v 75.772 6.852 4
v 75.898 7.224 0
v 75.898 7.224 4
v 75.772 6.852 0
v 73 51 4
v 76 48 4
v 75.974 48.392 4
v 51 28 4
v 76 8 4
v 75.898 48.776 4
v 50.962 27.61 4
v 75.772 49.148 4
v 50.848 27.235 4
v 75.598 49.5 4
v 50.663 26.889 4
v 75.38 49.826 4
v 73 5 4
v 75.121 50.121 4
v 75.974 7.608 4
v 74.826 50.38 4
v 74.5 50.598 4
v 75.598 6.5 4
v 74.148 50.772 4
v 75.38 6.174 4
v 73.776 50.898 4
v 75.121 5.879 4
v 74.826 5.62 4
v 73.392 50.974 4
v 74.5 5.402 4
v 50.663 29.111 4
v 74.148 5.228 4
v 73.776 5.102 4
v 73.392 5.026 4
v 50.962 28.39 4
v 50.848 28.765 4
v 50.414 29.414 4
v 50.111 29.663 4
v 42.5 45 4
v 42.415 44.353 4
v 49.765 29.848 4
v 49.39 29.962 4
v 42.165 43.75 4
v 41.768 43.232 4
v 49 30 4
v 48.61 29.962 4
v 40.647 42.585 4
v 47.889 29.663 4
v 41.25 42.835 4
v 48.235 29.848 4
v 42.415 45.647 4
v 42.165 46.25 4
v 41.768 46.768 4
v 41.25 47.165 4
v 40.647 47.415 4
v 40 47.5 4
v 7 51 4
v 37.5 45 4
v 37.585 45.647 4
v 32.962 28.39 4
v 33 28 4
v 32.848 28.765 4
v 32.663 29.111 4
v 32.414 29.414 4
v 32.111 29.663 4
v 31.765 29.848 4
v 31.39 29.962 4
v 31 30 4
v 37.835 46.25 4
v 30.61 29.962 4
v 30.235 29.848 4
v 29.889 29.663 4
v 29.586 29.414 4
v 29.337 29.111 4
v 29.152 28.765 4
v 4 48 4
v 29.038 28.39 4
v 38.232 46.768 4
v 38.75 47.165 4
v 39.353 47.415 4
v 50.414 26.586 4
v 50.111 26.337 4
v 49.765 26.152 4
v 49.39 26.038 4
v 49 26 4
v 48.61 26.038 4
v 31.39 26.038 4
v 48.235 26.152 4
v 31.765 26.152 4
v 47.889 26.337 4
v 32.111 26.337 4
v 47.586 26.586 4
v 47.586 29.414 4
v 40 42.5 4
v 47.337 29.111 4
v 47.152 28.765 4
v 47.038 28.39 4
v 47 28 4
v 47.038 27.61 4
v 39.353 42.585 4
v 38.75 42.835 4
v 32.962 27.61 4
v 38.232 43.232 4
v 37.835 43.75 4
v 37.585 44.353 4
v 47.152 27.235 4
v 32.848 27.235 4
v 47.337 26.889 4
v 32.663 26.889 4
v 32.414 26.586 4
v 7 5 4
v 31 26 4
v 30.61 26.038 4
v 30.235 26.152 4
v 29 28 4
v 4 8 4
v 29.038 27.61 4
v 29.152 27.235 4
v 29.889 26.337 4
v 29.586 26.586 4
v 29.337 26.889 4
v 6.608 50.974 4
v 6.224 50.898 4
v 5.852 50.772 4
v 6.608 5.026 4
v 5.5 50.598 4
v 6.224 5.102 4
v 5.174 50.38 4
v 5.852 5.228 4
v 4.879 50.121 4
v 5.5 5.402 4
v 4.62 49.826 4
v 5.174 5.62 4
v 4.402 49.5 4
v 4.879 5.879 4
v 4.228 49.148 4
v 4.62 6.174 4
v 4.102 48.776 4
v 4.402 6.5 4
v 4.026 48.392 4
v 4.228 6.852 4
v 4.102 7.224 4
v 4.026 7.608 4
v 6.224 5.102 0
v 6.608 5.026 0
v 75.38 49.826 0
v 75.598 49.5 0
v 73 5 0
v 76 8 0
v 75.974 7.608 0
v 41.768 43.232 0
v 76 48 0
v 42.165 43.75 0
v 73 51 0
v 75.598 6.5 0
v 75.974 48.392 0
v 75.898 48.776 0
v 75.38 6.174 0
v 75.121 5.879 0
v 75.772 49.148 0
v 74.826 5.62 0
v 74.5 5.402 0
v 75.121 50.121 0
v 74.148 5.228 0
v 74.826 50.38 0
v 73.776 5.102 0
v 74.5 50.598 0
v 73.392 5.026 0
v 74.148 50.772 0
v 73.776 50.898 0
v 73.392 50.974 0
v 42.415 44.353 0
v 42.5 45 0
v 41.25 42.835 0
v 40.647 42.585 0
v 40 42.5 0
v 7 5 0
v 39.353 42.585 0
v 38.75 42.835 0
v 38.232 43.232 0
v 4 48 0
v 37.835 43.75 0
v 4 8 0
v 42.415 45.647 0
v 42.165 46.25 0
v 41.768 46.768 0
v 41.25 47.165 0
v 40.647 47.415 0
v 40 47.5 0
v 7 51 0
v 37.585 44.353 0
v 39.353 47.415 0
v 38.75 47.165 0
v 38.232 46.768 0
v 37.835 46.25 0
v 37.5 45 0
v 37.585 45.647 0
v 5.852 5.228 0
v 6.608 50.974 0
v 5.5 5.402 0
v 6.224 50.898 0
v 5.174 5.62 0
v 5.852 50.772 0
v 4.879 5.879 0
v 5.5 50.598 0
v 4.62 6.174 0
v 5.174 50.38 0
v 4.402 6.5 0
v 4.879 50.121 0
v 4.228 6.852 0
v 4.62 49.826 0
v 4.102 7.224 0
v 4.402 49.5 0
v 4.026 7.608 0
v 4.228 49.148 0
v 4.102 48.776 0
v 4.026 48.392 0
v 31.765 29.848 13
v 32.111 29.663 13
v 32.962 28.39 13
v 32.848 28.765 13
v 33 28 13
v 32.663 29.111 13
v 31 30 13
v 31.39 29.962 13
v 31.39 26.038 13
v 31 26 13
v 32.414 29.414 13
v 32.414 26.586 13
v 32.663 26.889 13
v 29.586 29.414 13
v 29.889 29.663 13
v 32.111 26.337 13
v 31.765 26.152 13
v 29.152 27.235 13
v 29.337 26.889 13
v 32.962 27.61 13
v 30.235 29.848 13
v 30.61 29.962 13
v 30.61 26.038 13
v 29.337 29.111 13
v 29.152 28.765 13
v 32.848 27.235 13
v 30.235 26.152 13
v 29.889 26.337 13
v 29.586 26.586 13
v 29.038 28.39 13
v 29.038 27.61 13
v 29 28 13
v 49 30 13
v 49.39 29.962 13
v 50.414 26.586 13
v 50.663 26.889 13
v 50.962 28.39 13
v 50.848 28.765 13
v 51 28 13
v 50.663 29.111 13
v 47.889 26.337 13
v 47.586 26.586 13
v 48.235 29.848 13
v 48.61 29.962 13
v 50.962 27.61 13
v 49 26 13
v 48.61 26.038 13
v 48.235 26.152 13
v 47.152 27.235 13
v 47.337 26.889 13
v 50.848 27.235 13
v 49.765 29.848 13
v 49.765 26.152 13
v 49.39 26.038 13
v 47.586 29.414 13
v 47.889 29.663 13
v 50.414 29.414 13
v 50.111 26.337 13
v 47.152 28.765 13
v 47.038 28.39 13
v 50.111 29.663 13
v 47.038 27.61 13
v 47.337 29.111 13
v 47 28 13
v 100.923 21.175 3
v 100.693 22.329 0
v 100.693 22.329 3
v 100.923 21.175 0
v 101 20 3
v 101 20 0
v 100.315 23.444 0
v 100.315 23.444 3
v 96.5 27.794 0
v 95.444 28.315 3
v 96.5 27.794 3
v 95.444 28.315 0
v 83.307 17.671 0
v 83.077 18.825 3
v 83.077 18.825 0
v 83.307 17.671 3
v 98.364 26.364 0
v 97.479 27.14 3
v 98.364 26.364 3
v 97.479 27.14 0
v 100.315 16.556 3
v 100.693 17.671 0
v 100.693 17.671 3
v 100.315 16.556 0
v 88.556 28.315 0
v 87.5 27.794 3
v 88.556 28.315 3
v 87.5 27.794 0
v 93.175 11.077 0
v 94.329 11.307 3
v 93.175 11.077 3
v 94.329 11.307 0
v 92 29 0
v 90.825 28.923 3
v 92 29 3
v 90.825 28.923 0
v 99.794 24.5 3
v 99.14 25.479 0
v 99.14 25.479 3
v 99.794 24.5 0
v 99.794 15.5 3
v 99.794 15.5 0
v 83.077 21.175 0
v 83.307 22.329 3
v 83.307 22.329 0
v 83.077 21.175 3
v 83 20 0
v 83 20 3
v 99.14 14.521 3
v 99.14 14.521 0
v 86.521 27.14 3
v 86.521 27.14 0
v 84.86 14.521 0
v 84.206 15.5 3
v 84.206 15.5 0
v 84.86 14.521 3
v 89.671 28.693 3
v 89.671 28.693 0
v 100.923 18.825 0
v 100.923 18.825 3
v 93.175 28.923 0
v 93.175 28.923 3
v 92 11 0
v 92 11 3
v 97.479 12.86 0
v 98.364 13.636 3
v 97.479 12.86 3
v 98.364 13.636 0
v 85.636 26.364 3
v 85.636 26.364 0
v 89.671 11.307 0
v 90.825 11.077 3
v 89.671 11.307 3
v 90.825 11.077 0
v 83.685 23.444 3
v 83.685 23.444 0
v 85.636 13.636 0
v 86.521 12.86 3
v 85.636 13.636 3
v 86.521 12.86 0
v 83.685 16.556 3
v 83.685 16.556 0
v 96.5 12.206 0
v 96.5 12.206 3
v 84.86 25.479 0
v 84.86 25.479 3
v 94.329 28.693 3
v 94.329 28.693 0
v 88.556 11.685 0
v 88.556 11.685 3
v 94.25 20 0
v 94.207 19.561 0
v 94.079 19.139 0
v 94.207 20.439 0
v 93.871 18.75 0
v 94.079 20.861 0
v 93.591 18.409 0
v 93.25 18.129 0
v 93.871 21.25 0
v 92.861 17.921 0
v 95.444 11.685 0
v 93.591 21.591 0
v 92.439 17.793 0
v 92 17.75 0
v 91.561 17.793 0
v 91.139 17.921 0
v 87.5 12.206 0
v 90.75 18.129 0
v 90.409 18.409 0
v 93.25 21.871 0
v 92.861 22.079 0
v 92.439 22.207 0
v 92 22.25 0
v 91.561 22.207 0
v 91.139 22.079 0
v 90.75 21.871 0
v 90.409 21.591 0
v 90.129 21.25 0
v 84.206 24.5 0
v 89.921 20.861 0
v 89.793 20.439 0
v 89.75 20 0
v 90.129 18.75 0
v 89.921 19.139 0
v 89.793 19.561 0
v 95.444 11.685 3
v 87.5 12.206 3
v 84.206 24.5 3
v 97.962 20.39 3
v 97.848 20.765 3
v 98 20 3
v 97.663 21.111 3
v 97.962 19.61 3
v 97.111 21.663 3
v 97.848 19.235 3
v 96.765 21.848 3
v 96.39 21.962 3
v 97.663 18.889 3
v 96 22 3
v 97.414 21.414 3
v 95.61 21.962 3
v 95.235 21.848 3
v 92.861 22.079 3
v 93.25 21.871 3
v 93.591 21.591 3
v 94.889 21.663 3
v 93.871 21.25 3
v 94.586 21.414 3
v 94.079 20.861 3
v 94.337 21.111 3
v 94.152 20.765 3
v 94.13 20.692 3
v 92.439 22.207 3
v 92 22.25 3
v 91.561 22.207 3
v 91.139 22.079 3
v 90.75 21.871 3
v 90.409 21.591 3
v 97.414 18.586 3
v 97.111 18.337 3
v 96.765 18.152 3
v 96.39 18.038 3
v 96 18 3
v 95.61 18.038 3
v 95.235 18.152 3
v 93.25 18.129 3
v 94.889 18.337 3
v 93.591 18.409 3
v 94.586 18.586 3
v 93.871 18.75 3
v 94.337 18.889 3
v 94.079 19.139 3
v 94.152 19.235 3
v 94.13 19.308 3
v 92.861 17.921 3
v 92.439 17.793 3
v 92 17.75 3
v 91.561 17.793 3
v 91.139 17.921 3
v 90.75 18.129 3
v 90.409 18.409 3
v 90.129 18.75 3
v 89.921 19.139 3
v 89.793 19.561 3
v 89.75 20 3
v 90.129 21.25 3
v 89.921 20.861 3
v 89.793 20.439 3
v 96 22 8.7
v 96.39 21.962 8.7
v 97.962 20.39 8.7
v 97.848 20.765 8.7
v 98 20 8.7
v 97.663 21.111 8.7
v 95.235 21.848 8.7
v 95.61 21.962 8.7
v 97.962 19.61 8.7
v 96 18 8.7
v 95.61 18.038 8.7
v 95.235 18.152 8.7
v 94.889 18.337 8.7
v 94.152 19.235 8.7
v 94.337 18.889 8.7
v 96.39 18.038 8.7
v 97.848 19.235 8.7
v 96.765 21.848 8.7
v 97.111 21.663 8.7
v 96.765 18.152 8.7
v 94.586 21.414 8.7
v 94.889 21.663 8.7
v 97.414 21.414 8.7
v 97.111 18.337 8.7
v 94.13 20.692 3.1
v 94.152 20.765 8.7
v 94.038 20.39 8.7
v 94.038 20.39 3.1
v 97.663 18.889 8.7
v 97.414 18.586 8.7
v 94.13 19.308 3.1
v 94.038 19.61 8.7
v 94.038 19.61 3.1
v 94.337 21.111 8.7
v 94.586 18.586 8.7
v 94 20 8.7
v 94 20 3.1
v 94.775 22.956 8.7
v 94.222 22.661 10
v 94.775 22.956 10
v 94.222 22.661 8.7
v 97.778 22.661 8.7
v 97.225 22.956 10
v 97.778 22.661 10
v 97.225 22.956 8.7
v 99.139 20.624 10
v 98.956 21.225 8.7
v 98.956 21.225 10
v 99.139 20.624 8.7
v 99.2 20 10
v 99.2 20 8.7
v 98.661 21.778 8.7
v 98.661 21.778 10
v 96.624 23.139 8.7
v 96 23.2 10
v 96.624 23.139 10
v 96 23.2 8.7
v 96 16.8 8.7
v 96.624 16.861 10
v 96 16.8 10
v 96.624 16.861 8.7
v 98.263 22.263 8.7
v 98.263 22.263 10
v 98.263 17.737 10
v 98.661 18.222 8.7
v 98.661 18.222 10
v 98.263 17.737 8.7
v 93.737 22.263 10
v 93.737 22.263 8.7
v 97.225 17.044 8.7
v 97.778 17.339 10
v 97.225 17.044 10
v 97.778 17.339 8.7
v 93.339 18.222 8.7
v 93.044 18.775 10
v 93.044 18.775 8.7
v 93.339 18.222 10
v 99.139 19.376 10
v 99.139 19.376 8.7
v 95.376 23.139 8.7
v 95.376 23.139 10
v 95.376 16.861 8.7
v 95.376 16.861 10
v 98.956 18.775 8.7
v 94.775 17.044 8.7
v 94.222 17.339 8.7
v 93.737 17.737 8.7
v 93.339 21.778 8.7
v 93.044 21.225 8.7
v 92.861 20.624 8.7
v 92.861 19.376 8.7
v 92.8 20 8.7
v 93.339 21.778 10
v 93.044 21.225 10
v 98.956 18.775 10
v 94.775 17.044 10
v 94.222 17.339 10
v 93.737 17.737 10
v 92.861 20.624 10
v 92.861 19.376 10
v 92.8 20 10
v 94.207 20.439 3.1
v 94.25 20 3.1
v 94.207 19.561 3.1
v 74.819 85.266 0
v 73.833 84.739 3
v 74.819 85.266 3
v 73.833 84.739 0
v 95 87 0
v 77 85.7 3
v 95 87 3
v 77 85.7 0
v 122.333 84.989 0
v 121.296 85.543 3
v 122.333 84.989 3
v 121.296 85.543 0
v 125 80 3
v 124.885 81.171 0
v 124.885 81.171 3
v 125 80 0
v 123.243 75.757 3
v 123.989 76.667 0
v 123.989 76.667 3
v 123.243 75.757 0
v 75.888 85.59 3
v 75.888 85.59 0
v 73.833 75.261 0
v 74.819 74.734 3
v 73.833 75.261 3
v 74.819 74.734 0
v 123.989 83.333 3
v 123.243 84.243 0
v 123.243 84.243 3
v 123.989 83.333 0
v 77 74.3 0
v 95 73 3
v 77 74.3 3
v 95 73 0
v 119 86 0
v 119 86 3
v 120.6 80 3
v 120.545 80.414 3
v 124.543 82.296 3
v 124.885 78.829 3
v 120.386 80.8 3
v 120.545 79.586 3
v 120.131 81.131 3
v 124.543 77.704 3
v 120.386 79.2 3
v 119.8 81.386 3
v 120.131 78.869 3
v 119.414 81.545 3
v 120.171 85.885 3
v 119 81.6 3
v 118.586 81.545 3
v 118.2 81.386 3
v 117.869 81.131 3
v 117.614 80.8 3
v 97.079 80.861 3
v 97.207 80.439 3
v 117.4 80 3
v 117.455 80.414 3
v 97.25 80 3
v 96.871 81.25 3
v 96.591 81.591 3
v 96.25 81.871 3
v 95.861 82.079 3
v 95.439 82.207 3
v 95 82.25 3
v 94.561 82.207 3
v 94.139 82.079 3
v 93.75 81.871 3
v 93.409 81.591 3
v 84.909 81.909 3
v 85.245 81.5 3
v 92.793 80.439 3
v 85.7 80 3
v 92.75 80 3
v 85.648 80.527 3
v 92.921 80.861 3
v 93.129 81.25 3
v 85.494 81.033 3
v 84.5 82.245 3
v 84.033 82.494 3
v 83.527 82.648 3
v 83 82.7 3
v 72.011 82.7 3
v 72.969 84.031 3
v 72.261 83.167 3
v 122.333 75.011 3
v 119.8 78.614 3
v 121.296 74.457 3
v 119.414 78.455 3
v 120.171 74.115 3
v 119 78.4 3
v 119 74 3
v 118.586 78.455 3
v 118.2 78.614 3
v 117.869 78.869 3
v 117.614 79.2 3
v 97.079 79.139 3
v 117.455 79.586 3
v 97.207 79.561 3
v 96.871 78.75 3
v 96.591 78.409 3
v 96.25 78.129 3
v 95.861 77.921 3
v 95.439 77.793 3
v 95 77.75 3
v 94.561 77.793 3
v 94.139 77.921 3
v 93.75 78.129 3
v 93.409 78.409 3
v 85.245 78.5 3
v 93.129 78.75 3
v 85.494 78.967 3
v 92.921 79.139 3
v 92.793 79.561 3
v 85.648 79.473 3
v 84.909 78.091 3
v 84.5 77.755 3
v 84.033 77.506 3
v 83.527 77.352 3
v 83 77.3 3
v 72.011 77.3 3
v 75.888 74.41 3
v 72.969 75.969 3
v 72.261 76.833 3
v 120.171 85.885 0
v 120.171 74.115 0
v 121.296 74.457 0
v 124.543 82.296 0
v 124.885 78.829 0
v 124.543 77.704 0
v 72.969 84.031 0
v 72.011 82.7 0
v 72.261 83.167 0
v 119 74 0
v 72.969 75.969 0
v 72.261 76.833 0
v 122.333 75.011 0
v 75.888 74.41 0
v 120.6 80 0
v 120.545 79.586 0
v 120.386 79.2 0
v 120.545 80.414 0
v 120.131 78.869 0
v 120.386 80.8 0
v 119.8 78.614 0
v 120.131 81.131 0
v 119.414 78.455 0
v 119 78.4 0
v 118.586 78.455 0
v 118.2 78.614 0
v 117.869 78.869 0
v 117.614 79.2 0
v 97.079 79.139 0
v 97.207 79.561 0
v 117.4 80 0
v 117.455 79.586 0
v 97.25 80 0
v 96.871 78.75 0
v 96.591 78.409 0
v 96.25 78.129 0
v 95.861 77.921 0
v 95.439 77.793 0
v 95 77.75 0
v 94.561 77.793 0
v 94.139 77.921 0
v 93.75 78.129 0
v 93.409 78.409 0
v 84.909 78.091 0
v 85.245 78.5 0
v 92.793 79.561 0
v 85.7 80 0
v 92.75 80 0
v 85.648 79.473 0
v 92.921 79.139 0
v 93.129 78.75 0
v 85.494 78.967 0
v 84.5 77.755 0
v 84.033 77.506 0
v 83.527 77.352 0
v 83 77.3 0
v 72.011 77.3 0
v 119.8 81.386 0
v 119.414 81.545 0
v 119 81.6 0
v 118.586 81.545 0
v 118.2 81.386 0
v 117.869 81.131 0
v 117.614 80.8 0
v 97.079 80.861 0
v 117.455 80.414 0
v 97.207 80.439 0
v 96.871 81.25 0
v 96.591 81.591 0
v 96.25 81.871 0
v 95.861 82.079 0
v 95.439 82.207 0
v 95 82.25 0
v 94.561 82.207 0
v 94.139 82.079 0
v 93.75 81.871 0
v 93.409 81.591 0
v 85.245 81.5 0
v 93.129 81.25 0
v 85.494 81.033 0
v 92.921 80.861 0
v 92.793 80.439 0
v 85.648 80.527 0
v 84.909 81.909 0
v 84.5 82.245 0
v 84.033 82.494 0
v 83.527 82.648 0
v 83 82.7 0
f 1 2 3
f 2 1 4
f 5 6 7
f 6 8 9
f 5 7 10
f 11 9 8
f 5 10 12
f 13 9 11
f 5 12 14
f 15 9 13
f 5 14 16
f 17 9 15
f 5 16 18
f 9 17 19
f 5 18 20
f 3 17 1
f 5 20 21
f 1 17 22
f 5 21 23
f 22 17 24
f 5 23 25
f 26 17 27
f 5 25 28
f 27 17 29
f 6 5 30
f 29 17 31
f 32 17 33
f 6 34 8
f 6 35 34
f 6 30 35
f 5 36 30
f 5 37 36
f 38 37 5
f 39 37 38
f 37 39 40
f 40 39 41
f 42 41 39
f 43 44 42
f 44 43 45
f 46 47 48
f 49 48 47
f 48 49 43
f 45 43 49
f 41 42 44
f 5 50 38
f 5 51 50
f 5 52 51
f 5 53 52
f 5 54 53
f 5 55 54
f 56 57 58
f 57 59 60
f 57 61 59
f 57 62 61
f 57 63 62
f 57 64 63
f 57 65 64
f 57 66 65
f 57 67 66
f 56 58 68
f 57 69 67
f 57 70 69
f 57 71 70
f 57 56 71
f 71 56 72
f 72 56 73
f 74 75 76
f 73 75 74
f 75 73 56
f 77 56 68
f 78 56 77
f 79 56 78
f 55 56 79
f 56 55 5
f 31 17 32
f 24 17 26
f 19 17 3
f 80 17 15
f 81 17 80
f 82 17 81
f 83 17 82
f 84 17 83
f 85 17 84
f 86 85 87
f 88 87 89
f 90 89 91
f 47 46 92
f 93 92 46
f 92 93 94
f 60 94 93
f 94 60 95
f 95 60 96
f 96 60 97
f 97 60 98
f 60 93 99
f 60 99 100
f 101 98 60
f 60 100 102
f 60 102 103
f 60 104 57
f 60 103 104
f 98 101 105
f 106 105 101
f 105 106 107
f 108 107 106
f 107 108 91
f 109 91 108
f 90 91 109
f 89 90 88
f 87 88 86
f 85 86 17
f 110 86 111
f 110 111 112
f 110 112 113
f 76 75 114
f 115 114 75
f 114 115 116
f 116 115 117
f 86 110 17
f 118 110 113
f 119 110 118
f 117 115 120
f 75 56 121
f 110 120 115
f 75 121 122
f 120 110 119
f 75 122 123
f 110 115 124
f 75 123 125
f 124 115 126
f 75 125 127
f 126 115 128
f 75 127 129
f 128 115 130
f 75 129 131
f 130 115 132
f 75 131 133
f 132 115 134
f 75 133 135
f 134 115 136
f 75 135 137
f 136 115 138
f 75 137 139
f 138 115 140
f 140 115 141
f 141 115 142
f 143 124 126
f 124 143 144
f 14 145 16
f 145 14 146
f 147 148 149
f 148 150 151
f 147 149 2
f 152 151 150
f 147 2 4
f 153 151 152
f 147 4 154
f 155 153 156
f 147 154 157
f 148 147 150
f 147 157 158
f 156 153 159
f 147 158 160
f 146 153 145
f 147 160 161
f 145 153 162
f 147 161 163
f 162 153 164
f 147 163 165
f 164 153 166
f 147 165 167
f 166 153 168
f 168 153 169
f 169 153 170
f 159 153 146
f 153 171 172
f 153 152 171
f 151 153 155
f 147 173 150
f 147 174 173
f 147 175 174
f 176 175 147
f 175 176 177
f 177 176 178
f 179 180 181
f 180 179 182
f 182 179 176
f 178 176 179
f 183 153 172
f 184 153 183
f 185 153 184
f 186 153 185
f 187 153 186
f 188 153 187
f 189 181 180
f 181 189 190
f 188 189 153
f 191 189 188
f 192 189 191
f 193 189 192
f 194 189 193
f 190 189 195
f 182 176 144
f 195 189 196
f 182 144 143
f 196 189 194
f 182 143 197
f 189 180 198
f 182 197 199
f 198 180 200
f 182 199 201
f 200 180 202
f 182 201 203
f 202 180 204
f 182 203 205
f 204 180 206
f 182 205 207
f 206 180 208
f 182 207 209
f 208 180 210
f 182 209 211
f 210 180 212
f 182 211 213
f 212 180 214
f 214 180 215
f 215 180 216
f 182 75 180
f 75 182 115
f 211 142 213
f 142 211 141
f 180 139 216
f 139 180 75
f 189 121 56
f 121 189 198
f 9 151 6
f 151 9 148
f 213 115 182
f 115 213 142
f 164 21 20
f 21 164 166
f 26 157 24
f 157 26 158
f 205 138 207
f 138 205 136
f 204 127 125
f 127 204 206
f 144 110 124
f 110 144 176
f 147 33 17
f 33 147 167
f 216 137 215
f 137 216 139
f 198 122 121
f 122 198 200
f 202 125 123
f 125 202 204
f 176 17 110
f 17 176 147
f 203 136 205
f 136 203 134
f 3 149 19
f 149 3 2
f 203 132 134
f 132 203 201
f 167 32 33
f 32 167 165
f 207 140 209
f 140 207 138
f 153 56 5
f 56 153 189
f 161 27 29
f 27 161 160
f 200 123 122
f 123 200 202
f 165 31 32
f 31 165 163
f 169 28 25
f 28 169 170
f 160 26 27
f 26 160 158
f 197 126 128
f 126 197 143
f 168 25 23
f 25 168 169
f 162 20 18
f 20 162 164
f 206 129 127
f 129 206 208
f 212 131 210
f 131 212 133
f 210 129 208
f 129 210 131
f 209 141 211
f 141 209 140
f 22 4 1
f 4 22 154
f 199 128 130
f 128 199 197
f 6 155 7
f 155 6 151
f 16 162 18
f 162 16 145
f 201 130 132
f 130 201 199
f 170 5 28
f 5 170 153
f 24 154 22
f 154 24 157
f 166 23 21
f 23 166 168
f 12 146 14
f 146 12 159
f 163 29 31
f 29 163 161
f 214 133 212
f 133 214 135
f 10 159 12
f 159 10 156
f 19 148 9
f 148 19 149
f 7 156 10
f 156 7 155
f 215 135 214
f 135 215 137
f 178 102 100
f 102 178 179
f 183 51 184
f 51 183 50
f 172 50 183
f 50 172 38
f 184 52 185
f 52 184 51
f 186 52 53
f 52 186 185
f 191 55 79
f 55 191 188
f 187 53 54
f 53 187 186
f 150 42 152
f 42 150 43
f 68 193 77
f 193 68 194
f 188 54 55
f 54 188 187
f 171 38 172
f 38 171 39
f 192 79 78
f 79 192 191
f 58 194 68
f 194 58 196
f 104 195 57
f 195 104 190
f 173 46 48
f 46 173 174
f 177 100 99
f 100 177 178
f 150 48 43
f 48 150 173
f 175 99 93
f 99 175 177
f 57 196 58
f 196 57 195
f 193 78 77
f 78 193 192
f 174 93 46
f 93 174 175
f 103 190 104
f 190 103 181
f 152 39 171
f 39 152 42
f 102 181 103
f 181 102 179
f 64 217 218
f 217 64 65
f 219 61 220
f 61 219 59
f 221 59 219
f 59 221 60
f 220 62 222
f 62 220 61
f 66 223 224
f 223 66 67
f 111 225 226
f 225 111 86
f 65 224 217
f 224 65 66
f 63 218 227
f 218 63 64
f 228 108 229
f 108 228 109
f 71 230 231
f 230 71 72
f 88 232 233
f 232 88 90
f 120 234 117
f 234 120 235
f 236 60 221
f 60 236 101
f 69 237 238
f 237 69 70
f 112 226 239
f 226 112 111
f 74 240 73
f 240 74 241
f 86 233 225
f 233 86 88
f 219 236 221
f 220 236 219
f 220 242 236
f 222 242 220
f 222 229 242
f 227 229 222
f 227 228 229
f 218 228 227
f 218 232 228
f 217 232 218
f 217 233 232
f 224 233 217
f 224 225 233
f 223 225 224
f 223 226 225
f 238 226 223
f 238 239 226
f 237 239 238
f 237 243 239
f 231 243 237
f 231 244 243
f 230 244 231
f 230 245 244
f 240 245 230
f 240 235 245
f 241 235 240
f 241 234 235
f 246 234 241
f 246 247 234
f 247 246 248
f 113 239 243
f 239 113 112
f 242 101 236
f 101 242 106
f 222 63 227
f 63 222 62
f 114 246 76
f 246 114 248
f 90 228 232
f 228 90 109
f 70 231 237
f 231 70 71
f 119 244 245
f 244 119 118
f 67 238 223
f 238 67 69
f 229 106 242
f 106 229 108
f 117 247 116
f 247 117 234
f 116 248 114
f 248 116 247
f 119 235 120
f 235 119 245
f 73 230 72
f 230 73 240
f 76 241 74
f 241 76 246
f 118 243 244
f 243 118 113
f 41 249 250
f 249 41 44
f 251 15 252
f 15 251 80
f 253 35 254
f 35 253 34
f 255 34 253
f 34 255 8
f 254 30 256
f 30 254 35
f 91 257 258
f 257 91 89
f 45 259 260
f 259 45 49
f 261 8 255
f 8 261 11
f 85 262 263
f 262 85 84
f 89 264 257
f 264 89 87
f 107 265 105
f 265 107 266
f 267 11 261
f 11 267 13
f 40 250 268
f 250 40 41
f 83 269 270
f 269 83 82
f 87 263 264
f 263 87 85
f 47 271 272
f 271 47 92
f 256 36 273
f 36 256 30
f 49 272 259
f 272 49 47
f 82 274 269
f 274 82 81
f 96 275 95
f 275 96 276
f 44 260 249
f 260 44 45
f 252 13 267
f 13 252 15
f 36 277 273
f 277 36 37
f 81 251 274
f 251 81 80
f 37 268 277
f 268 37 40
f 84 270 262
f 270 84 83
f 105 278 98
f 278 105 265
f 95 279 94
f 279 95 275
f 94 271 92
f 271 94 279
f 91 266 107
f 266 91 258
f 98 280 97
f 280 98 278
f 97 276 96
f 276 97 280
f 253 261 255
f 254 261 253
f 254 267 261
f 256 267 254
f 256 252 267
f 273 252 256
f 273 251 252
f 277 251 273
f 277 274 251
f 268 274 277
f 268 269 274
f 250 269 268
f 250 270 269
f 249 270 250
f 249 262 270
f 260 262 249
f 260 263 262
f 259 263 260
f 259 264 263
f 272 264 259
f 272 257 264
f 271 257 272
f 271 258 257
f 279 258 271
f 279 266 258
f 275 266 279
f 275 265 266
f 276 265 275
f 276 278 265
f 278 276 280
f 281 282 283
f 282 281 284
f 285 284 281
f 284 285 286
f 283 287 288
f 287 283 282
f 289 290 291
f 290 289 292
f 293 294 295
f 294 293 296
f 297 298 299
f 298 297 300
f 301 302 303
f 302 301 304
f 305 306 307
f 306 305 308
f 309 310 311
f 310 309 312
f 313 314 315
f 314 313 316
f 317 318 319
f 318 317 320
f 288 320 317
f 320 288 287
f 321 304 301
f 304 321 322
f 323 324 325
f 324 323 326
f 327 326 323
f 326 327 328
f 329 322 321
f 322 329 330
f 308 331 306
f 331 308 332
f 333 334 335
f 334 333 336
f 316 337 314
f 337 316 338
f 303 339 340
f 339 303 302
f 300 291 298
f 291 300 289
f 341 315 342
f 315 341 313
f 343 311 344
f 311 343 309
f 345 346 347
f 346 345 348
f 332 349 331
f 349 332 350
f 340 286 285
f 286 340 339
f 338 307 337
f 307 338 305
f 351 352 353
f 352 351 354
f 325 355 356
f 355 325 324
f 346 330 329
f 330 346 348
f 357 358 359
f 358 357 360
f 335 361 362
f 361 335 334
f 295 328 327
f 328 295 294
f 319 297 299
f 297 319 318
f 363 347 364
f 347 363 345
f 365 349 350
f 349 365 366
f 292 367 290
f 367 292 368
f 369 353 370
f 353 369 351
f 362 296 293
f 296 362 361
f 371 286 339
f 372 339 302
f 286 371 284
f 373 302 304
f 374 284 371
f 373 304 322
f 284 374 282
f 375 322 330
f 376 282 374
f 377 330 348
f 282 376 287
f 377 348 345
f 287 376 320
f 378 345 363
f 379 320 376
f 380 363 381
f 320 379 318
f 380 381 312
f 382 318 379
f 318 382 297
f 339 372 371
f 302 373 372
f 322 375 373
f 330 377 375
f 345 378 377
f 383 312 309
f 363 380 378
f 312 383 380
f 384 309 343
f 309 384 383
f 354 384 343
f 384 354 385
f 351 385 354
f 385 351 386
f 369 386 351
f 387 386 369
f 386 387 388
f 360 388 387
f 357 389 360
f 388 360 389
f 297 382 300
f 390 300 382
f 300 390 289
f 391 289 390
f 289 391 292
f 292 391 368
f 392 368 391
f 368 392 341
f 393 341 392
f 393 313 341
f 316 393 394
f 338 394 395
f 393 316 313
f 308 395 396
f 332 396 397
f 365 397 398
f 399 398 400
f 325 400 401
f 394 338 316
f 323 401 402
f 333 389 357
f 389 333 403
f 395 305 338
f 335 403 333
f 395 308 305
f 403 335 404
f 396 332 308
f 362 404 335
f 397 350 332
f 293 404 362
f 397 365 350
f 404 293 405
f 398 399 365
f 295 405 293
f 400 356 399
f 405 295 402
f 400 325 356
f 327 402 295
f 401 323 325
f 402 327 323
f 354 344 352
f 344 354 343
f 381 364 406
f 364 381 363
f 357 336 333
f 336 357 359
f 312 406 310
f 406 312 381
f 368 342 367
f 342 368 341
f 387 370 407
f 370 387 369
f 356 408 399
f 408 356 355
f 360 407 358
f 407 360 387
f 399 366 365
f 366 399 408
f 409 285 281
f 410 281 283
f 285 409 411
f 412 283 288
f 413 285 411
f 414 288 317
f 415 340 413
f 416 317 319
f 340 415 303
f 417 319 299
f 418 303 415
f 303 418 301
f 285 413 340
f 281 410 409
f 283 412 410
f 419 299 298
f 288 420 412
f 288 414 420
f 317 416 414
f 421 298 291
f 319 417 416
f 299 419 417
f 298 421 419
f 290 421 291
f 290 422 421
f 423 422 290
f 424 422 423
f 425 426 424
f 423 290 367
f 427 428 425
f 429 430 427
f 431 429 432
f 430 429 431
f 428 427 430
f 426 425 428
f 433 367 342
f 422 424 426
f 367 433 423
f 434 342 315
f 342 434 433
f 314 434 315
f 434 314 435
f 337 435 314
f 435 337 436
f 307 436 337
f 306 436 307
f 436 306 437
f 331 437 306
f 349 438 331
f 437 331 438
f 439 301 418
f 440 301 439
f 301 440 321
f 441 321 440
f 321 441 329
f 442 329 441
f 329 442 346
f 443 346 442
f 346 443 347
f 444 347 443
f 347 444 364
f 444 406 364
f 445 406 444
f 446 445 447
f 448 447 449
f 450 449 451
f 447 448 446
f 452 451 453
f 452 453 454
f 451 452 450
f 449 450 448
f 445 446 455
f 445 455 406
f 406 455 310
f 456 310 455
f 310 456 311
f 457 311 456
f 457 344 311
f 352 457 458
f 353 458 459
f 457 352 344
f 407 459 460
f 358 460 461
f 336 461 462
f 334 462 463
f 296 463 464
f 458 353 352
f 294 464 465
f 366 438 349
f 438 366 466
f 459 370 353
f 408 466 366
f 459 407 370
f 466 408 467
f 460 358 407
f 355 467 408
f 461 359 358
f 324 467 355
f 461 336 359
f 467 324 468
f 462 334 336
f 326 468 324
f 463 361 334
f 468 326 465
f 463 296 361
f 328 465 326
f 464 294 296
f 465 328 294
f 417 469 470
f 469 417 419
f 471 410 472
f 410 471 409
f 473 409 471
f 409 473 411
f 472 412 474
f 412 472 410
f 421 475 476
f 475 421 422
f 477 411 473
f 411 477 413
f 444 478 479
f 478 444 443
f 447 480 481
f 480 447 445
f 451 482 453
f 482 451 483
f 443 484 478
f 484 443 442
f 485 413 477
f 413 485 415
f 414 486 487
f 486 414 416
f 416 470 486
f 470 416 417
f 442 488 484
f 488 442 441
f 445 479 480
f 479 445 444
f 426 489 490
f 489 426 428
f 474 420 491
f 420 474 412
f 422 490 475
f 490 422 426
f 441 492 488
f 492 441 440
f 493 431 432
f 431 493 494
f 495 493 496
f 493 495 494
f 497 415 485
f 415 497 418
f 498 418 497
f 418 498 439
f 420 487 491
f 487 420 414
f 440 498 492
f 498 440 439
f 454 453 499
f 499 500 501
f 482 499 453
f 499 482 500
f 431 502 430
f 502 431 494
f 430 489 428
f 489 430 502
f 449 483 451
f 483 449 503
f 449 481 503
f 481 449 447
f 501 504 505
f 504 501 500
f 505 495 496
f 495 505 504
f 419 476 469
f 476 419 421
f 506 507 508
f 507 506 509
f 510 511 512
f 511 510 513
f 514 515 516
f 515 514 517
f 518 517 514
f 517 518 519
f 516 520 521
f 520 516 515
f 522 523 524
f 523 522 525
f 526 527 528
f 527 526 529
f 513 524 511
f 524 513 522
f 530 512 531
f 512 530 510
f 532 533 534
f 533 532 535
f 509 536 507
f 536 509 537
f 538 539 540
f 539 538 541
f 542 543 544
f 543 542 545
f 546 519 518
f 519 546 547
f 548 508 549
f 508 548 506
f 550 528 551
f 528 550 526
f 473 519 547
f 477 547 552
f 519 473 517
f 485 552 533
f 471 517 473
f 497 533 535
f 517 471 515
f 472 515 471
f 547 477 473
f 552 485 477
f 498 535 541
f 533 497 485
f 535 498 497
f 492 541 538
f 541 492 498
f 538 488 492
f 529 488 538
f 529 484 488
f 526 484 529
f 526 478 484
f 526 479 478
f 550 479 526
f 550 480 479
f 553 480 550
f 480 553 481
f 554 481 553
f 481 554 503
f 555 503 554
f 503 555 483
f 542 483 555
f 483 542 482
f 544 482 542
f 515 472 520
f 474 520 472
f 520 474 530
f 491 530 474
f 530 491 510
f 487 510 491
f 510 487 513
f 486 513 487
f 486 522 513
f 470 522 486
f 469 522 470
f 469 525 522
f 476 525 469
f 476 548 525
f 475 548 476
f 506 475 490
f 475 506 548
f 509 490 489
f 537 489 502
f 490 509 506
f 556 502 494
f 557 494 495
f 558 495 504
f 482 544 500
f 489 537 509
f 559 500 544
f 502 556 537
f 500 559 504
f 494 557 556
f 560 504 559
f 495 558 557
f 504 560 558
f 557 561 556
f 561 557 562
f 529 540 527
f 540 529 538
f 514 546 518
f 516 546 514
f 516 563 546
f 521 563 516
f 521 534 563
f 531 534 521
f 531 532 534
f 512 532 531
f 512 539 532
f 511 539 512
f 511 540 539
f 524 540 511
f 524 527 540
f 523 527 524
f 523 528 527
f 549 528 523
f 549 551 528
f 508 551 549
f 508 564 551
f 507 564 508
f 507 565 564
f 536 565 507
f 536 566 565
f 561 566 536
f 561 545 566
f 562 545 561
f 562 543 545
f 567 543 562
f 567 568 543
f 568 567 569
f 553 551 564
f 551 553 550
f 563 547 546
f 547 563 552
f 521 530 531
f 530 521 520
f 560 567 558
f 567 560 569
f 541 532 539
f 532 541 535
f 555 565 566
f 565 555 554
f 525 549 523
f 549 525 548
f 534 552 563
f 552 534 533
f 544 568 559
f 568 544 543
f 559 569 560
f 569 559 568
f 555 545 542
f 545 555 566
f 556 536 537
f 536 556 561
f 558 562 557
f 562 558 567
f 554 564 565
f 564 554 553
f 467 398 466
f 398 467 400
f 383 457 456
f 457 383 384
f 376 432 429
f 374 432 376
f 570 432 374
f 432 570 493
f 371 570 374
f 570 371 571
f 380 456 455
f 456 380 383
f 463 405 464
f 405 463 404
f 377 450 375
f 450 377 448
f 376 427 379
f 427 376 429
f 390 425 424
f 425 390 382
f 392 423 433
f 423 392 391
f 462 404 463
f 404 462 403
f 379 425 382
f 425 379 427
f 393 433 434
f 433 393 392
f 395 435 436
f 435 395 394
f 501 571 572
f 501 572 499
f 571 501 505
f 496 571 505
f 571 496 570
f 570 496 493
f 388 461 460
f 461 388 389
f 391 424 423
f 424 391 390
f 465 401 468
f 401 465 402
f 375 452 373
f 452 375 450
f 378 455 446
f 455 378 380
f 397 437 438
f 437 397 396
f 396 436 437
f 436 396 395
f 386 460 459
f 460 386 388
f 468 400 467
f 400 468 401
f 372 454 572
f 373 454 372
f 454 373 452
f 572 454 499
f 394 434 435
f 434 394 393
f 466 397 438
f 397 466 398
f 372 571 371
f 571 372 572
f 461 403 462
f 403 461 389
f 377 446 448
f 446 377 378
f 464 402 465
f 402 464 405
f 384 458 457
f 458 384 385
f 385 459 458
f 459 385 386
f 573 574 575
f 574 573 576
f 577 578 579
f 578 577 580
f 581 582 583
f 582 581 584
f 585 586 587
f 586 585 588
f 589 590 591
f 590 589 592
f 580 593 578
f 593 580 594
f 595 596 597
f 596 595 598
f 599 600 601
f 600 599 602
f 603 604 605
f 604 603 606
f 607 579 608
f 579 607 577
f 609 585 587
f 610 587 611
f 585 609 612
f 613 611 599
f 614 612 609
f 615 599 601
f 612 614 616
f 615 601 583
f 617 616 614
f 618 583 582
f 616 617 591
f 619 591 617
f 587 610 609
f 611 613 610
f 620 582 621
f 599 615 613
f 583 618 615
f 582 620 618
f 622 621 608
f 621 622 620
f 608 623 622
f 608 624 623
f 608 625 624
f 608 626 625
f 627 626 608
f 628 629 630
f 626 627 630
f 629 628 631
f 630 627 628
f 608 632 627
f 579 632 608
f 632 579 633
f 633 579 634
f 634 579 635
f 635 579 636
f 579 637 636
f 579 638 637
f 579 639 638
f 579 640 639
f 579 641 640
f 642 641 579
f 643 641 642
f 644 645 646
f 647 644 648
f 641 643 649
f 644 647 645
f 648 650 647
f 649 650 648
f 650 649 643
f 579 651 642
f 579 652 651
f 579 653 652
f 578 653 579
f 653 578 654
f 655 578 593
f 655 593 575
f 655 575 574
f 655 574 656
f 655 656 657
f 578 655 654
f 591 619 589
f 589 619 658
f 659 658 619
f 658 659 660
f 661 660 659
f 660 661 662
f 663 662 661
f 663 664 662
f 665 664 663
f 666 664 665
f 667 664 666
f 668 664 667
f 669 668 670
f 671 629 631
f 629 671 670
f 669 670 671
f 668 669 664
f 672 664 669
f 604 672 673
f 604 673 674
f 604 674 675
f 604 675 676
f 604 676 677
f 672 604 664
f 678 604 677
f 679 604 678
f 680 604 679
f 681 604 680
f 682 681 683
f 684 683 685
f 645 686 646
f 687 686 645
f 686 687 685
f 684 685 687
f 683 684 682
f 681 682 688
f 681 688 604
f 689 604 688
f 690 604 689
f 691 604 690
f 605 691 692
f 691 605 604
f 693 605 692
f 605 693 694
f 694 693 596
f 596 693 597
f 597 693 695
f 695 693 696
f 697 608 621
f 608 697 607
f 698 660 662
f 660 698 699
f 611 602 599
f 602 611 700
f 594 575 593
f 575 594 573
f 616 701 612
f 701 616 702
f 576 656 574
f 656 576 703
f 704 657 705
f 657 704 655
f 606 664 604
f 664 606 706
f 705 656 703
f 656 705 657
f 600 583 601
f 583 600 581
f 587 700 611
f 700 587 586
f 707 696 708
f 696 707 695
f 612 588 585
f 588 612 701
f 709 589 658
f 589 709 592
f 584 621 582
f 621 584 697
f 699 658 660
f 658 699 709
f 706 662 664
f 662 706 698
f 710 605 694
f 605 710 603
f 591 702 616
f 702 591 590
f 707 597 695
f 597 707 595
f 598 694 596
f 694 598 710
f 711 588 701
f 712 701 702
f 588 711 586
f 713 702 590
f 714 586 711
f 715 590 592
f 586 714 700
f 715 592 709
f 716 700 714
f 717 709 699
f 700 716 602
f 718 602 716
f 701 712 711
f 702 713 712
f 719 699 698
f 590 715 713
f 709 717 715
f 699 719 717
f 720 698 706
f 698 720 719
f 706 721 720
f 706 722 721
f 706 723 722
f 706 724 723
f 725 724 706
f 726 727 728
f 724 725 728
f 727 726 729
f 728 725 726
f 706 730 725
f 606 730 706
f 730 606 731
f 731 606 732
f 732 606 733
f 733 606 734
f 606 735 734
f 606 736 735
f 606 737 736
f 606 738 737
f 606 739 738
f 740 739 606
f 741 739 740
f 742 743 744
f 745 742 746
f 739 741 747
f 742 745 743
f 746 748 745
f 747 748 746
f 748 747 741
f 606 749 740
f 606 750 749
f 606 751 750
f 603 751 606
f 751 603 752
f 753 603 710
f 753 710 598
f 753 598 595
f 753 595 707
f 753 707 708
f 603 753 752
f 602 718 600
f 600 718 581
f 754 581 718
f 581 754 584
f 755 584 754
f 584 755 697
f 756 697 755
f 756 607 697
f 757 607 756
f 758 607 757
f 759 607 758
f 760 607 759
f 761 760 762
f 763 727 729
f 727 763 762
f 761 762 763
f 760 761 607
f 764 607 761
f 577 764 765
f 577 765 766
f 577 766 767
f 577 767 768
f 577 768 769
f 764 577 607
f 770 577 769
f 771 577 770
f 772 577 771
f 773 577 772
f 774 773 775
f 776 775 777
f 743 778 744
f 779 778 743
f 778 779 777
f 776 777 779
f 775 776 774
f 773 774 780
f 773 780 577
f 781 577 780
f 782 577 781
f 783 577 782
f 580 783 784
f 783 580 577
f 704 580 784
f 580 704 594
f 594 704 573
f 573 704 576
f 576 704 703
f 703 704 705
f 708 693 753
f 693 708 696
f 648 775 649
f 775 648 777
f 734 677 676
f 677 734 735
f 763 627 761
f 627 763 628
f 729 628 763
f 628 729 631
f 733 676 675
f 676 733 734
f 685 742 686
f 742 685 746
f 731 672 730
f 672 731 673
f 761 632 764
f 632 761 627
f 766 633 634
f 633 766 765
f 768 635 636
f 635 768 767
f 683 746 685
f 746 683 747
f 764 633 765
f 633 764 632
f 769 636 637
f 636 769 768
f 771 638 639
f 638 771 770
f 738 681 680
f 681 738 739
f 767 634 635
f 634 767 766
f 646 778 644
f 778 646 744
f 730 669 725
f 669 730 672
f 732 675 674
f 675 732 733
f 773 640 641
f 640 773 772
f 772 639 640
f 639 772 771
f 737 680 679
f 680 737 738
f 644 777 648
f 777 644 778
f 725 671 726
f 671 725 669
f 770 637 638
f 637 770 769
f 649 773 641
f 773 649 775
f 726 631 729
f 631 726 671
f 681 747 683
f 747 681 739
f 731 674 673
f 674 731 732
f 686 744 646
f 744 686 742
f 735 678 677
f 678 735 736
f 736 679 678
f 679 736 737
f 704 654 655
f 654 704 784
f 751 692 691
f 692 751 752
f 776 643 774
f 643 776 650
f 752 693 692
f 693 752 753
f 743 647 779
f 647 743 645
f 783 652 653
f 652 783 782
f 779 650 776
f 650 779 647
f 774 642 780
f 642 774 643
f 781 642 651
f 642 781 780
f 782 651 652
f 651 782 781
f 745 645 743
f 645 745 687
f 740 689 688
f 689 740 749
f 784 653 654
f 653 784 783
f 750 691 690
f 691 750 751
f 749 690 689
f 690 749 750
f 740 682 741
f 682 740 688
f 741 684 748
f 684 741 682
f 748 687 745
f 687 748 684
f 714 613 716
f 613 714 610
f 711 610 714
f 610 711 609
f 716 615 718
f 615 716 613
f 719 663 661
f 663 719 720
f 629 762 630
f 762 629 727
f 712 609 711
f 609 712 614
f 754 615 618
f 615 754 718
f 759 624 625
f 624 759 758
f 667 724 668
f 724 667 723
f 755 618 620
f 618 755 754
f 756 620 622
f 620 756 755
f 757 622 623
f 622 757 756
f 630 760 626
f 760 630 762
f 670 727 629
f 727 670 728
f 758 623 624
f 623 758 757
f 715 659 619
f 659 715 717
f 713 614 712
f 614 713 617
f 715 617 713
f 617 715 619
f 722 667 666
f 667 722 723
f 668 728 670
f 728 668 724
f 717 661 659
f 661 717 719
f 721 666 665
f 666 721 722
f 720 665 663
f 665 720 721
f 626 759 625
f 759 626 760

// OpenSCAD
/*
Sample 134: Kurbel-Langloch-Schwinge — Kurbelradius 4 mm
Generated from the FDM Mechanical Sample Library.
Units: millimetres.

Override examples:
  openscad -o custom.stl -D 'view="plate"' -D 'render_fn=64' model.scad
  openscad -o preview.png -D 'view="assembly"' model.scad
*/
use <../../../library/fdm_mechanisms.scad>

render_fn = is_undef(render_fn) ? 48 : render_fn;
view = is_undef(view) ? "plate" : view;
$fn = render_fn;

sample_crank_rocker(
    view=view,
    crank_r=4,
    pivot_offset=18,
    slot_w=5.4,
    pin_d=4,
    rocker_r=24,
    plate_t=3
);
